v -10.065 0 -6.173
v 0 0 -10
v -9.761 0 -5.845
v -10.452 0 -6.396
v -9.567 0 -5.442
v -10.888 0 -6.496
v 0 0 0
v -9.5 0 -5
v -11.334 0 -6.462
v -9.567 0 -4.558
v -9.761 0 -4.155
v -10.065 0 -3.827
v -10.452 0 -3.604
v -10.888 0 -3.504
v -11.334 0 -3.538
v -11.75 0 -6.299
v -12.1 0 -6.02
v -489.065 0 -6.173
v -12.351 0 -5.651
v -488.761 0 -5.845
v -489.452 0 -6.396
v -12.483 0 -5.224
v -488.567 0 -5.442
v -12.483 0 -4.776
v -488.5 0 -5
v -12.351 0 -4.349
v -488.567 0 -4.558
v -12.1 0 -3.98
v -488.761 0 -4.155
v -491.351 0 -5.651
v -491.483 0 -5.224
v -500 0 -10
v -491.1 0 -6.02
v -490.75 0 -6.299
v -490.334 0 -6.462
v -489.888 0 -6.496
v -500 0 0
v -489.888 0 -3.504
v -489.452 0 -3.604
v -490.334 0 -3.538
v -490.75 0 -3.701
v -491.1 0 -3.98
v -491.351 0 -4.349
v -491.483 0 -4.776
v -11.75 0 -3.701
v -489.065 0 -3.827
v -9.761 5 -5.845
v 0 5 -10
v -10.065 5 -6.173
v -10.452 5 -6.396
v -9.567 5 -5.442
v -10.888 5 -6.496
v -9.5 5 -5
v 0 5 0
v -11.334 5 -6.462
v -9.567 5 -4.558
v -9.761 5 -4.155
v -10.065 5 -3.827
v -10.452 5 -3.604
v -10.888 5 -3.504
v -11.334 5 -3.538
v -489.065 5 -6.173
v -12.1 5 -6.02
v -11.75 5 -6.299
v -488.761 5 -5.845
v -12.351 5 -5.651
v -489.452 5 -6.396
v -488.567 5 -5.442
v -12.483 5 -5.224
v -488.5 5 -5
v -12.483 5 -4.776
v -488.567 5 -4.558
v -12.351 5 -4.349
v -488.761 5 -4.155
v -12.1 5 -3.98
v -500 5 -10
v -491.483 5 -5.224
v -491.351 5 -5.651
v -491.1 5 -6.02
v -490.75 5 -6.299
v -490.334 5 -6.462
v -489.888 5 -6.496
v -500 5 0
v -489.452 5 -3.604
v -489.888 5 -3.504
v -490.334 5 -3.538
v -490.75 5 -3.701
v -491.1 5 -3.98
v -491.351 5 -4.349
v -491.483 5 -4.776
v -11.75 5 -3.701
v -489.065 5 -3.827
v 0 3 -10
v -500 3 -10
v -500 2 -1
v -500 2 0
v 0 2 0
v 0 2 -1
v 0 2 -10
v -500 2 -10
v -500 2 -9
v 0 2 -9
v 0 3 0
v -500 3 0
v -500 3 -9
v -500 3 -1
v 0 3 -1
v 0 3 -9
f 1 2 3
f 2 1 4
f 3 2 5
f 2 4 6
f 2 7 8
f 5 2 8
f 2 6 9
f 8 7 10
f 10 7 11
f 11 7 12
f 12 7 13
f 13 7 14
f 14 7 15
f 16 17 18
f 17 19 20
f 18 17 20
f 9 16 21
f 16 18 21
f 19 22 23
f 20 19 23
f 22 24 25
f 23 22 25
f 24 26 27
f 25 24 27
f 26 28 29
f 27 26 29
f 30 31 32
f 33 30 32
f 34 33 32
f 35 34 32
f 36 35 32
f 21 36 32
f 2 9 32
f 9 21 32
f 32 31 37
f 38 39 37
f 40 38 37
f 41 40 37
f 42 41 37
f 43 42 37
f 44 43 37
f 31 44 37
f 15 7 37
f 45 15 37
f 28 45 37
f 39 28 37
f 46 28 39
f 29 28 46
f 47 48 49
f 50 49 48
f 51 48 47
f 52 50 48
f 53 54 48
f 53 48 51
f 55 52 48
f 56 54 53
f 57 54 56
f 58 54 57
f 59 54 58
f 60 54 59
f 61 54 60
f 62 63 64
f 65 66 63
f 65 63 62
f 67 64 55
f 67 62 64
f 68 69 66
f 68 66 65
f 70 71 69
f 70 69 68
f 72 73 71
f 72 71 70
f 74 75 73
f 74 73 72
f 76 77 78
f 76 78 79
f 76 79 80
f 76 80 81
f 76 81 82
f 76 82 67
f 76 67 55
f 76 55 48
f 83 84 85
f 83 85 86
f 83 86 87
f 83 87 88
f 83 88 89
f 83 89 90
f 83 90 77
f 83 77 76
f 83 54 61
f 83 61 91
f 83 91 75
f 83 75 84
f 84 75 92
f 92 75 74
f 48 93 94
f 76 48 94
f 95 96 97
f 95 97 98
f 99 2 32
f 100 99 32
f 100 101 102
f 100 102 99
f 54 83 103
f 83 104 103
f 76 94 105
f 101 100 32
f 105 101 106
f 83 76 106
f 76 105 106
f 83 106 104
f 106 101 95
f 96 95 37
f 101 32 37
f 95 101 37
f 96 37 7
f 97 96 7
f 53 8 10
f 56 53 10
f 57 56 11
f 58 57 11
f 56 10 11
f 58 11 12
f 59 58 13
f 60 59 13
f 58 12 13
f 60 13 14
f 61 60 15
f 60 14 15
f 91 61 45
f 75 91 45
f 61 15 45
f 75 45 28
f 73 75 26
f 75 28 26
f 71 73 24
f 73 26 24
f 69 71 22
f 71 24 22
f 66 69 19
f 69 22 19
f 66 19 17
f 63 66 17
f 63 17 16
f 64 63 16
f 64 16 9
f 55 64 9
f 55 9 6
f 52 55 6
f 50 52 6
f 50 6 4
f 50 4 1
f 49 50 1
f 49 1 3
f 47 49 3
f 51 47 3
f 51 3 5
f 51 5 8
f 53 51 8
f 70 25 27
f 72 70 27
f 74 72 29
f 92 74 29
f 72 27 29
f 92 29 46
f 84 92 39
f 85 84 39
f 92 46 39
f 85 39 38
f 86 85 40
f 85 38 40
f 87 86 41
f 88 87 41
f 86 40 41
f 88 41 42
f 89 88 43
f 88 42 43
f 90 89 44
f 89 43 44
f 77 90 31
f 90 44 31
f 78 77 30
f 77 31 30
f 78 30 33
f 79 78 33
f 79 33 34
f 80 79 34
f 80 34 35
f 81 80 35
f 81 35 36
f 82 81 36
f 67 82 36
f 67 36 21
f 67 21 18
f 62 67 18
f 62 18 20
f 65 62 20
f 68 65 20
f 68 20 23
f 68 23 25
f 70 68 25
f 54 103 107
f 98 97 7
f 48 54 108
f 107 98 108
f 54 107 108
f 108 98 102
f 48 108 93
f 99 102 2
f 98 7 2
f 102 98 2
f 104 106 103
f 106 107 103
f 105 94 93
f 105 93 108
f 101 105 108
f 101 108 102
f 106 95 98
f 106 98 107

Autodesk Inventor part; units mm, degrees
ref_plane "YZ Plane" through (0, 0, 0) normal (1, 0, 0) x (0, 1, 0)
ref_plane "XZ Plane" through (0, 0, 0) normal (0, 1, 0) x (-1, 0, 0)
ref_plane "XY Plane" through (0, 0, 0) normal (0, 0, 1) x (1, 0, 0)
sketch "Sketch1" plane through (0, 0, 0) normal (0, 1, 0) x (-1, 0, 0)
  line L0 (0, 0) -> (0, -10)
  line L1 (0, -10) -> (500, -10)
  line L2 (500, -10) -> (500, 0)
  line L3 (500, 0) -> (0, 0)
  dimension "d0" = 10
  dimension "d1" = 500
  dimension "d2" = 500
extrude "Extrusion1" add sketch "Sketch1" along normal blind 5
sketch "Sketch5" plane through (0, 0, 0) normal (1, 0, 0) x (0, 0, -1)
  line L0 (1, 3) -> (0, 3)
  line L1 (0, 3) -> (0, 2)
  line L2 (0, 2) -> (1, 2)
  line L3 (1, 2) -> (1, 3)
  line L4 (10, 3) -> (9, 3)
  line L5 (9, 3) -> (9, 2)
  line L6 (9, 2) -> (10, 2)
  line L7 (10, 2) -> (10, 3)
  line L8 (10, 0) -> (10, 5) projected
  line L9 (0, 0) -> (0, 5) projected
  point P0 (10, 2.5)
  point P1 (0, 2.5)
  point P2 (10, 2.5)
  point P3 (0, 2.5)
  dimension "d33" = 1
  dimension "d34" = 1
  dimension "d35" = 1
  dimension "d36" = 1
  dimension "d37" = 1
  dimension "d38" = 1
  dimension "d39" = 1
extrude "Extrusion2" cut sketch "Sketch5" against normal up to next
sketch "Sketch7" plane through (0, 0, 0) normal (0, -1, 0) x (1, 0, 0)
  circle A0 centre (-11, -5) radius 1.5
  circle A1 centre (-490, -5) radius 1.5
  line L0 (-500, -10) -> (-500, 0) projected
  point P0 (0, 0)
  dimension "d42" = 3
  dimension "d43" = 3
  dimension "d44" = 479
  dimension "d45" = 10
extrude "Extrusion3" cut sketch "Sketch7" against normal up to next
sketch "Sketch2" plane through (0, 0, 0) normal (0, -1, 0) x (1, 0, 0)
  point P0 (-485, -5)
sketch "Sketch3" plane through (0, 0, 0) normal (0, -1, 0) x (1, 0, 0)
  point P0 (-15, -5)
properties part number "relsa2" material "Brass, Soft Yellow"
